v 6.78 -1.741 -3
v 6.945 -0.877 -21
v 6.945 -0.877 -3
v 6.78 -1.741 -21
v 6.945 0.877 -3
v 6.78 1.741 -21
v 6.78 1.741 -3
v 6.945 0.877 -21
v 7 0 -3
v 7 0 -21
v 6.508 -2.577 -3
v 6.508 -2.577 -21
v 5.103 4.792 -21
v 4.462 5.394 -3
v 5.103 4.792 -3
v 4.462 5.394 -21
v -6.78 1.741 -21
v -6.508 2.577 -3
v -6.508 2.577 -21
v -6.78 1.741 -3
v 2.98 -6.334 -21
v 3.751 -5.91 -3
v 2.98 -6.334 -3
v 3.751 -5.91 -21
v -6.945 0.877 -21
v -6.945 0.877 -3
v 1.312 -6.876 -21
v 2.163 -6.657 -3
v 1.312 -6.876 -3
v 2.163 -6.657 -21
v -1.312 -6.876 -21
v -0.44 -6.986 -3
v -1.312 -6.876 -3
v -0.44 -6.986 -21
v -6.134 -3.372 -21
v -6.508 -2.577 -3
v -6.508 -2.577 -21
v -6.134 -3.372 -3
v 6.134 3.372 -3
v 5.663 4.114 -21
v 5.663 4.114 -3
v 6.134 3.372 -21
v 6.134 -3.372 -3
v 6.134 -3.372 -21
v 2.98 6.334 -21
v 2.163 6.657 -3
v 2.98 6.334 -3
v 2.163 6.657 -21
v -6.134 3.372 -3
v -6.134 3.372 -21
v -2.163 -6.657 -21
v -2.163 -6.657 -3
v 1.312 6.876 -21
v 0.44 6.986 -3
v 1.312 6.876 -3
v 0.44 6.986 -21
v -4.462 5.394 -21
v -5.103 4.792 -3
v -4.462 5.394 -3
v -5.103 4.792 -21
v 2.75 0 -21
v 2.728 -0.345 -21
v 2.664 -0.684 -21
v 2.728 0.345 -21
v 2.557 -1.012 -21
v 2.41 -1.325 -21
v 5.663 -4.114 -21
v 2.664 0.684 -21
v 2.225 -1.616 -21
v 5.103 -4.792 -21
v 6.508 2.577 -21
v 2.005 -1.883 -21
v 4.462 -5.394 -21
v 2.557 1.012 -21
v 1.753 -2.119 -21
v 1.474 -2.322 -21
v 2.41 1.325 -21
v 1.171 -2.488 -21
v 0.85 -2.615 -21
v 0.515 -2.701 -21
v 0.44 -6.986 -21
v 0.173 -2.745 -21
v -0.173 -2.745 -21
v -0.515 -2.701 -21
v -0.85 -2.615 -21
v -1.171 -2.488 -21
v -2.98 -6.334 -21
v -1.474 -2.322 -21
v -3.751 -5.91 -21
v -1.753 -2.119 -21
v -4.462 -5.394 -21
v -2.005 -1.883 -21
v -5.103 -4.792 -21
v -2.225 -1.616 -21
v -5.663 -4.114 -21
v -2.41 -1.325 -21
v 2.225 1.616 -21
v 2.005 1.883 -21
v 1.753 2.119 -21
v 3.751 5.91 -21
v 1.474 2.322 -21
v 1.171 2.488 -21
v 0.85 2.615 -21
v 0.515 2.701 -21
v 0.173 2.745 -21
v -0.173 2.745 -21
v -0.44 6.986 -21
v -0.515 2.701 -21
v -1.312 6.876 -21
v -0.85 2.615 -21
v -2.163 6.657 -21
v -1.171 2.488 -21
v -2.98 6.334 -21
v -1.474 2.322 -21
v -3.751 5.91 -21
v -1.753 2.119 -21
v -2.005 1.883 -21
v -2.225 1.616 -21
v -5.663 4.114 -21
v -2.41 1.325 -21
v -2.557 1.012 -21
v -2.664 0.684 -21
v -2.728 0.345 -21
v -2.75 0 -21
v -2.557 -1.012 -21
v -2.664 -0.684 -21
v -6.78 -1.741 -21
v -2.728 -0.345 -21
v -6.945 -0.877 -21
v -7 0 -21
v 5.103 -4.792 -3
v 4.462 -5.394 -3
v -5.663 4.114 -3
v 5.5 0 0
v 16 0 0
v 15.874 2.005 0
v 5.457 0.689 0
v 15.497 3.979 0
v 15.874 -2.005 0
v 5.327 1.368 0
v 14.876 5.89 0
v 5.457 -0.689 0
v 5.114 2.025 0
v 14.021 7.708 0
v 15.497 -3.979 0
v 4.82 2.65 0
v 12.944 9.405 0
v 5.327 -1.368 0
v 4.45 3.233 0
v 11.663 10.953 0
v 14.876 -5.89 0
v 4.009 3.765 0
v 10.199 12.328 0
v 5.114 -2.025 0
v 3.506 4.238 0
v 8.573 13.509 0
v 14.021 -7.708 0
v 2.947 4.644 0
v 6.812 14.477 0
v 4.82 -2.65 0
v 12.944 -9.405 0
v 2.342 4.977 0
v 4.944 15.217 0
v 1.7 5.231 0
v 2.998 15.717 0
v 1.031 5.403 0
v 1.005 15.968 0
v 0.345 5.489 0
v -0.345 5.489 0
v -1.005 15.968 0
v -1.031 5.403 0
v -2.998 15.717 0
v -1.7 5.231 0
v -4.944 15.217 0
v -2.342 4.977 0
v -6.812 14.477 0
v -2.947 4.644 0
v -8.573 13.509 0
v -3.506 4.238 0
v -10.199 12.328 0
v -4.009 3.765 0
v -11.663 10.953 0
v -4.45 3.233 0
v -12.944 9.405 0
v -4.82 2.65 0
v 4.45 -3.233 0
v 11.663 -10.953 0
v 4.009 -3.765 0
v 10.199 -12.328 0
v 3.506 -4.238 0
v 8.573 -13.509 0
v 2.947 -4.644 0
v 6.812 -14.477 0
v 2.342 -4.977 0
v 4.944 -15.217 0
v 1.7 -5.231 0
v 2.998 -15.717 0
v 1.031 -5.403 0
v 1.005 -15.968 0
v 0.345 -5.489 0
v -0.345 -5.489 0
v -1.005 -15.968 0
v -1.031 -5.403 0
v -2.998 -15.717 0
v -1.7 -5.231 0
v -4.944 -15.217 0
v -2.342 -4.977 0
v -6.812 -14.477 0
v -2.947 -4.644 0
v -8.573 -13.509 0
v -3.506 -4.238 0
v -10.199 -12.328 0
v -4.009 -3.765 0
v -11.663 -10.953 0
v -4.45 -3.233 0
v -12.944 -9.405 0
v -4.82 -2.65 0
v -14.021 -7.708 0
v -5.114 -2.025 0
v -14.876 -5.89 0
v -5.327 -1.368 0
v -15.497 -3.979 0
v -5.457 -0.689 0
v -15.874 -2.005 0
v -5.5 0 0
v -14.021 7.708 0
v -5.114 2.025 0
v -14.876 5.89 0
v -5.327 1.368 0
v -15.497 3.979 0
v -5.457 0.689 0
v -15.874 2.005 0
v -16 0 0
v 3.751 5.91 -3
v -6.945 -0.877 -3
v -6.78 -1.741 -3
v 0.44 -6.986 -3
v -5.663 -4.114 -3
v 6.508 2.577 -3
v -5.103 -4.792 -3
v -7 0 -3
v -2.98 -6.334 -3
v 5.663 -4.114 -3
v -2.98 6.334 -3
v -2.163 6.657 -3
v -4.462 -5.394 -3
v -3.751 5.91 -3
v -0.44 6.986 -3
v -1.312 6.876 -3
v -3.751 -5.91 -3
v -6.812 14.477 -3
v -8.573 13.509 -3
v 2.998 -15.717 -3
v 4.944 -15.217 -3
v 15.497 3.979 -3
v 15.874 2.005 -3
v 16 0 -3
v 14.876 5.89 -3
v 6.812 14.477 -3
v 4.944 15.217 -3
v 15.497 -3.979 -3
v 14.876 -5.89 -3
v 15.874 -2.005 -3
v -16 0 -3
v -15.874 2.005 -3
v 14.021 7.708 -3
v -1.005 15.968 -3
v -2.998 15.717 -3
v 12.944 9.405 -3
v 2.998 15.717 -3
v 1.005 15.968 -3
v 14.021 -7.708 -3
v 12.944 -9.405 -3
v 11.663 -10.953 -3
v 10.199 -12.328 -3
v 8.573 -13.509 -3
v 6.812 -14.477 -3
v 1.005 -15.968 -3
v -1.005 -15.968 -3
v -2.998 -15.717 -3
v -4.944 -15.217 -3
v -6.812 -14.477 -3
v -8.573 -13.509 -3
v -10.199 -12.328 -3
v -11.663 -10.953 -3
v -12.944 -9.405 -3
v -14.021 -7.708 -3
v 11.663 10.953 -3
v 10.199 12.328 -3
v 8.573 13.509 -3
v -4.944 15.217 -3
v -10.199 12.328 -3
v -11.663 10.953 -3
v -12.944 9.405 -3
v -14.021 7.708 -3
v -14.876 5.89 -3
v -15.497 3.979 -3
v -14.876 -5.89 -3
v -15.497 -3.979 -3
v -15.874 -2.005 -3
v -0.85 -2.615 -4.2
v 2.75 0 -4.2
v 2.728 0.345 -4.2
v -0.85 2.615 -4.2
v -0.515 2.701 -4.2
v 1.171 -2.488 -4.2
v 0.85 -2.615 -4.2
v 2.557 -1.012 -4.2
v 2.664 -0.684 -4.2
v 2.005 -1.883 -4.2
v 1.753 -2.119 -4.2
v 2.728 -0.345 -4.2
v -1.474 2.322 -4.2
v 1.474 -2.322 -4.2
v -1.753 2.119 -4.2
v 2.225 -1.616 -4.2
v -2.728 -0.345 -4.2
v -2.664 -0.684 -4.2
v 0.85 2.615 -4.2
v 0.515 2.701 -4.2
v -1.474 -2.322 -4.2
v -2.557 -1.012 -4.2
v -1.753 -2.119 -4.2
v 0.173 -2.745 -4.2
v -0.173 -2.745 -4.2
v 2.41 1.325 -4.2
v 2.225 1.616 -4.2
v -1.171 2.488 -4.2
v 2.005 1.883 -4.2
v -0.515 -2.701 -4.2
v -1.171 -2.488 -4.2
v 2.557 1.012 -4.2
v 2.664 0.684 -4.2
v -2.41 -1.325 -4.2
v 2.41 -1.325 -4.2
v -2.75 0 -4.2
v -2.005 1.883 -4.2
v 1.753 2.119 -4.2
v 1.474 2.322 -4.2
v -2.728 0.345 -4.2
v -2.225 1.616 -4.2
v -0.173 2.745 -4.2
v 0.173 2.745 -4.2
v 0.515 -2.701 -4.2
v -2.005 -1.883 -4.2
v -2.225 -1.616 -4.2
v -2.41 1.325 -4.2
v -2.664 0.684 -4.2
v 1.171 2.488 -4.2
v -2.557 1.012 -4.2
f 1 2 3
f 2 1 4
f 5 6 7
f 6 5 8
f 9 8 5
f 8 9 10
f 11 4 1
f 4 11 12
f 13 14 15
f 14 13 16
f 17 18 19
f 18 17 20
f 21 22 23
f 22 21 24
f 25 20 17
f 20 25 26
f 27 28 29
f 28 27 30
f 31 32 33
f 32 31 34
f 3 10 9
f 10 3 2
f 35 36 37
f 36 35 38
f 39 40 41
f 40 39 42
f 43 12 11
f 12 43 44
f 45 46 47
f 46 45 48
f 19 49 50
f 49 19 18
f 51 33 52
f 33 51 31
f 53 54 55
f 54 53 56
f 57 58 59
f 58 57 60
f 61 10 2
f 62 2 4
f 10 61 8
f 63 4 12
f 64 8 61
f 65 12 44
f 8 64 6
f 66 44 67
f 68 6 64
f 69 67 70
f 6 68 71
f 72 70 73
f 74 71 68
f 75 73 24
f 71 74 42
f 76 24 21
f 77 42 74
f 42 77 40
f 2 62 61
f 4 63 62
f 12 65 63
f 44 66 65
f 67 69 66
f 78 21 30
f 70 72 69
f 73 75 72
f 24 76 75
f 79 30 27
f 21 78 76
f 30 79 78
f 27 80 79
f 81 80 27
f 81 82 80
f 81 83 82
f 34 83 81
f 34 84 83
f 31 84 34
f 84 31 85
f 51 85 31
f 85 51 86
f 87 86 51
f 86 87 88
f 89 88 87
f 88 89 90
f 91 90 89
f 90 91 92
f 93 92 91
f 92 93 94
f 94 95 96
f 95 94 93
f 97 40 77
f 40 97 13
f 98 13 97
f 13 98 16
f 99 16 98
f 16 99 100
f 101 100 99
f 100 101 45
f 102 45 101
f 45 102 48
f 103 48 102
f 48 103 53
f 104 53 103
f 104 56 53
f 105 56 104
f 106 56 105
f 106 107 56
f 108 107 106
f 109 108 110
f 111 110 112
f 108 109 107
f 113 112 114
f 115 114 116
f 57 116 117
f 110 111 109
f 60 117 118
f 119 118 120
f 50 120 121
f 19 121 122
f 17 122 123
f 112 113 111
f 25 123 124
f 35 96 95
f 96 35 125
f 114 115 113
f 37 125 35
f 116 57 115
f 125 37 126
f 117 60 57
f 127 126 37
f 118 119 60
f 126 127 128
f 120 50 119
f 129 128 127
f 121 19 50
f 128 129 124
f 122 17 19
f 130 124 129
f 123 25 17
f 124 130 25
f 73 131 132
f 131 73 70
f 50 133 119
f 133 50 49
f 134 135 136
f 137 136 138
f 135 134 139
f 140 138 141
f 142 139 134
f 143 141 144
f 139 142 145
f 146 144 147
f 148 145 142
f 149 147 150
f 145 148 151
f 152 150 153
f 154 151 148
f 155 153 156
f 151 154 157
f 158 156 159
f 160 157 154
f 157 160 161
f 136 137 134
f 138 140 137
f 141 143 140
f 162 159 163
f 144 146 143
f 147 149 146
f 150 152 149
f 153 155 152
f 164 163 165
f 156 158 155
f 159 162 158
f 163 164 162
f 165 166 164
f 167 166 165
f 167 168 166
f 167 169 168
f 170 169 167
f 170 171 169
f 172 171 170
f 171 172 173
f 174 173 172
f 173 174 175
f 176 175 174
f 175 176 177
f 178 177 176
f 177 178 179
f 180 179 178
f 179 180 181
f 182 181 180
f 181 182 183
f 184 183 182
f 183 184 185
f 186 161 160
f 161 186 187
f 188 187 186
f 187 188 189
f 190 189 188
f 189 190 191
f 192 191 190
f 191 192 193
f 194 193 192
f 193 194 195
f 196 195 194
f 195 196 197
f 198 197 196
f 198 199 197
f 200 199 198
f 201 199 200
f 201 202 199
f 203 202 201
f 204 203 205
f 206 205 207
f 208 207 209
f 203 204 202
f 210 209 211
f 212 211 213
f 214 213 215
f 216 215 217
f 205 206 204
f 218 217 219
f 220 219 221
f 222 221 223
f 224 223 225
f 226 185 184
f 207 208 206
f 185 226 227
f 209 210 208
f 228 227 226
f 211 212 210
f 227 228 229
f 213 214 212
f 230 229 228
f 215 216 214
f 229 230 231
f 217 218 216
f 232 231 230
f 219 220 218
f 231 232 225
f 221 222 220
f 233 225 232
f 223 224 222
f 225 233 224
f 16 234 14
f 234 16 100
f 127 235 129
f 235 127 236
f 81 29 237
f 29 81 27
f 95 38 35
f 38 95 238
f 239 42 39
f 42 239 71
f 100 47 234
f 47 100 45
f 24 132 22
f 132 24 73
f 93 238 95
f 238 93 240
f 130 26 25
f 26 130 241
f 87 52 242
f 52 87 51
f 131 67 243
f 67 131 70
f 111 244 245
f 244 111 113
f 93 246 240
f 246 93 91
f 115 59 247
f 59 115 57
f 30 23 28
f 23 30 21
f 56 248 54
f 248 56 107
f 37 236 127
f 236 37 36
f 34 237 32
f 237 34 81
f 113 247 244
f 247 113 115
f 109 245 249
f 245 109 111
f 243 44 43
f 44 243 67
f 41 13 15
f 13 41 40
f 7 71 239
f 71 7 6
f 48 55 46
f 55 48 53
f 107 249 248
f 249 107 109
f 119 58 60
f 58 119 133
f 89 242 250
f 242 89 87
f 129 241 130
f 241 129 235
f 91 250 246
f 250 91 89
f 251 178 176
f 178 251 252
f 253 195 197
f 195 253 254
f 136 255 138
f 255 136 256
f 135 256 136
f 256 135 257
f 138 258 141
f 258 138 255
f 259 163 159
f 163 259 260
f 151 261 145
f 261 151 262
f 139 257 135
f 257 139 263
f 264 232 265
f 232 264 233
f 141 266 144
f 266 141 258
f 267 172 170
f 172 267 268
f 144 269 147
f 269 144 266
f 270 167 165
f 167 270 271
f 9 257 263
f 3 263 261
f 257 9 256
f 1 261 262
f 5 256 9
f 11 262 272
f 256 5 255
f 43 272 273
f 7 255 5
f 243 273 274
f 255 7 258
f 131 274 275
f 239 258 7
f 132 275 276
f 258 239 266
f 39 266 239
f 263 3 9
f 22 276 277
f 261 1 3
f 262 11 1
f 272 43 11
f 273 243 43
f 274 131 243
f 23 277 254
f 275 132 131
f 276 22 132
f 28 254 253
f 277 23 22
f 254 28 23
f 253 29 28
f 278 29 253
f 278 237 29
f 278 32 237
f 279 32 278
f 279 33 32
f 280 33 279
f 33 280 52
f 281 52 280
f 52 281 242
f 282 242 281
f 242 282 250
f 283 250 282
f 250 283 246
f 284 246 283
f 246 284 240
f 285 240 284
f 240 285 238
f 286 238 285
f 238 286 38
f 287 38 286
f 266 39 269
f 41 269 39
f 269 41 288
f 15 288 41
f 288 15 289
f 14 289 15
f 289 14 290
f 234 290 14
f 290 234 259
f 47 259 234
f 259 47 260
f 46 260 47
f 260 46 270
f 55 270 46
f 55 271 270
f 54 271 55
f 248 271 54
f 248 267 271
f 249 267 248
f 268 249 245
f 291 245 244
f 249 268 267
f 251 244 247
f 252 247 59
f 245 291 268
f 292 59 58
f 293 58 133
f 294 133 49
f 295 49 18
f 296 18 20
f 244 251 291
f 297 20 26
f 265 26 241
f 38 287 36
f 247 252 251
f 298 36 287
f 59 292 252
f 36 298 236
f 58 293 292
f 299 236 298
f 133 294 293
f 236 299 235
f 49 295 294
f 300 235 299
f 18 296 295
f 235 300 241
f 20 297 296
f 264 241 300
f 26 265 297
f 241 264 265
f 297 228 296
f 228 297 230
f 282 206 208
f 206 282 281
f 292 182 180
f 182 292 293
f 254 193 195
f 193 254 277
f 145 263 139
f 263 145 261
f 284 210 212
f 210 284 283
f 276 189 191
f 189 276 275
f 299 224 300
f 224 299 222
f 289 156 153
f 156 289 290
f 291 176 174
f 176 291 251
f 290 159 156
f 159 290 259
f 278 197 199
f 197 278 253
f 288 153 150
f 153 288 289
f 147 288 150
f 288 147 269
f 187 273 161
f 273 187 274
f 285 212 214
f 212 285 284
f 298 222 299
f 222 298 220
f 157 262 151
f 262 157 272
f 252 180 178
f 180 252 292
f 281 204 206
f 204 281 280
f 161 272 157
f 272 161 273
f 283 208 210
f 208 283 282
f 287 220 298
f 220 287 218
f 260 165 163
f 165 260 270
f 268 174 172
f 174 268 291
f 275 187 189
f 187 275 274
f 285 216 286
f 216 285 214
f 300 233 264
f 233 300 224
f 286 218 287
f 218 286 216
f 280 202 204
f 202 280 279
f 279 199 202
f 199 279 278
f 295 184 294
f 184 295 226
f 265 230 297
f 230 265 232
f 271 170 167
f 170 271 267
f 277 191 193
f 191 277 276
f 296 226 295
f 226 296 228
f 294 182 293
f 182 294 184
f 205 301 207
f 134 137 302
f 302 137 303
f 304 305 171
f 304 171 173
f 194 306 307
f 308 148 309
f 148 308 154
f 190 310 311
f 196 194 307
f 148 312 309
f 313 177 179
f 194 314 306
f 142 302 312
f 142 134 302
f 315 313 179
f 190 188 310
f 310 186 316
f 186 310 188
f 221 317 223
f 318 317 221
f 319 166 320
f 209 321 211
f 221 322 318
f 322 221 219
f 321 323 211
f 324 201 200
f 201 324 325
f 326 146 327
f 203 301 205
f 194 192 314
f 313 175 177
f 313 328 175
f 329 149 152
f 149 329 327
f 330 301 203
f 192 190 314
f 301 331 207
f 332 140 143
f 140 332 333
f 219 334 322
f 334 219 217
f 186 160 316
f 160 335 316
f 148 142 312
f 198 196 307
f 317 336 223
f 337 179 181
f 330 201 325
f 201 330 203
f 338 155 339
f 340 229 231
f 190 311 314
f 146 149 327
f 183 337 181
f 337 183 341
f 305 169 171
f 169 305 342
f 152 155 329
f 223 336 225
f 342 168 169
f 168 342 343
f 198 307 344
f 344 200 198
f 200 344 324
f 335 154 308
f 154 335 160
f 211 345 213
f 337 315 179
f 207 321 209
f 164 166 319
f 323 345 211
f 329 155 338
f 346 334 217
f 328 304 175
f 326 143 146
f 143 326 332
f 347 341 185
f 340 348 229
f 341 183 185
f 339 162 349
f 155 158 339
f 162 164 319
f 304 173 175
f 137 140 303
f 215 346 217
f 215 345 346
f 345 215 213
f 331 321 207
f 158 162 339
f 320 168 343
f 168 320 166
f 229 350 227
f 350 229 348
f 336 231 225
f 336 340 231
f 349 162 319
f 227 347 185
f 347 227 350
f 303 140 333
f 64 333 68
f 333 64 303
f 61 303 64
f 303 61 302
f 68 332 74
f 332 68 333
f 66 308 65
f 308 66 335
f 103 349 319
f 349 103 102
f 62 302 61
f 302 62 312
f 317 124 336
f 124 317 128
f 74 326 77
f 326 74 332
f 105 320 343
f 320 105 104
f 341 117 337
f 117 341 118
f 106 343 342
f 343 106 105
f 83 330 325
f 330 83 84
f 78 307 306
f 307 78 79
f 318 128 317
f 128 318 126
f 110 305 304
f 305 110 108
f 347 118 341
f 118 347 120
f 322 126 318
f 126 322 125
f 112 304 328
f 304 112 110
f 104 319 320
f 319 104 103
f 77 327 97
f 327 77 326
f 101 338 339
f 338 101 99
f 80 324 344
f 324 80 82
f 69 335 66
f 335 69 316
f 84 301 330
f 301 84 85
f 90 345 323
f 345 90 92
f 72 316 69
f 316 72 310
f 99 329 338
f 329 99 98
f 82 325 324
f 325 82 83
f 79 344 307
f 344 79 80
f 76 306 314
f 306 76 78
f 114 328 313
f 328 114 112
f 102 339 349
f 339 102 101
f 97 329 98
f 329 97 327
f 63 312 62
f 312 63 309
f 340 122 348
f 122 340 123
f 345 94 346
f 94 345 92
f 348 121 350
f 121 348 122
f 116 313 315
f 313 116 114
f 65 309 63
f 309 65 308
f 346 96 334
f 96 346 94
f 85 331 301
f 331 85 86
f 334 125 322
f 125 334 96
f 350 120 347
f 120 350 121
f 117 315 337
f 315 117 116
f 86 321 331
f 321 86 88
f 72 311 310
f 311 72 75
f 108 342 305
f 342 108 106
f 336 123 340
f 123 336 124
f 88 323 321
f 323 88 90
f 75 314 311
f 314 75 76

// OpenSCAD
$fn = 50;


difference() {
	union() {
		translate(v = [0, 0, -21.0000000000]) {
			cylinder(h = 21, r = 7.0000000000);
		}
		translate(v = [0, 0, -3.0000000000]) {
			cylinder(h = 3, r = 16.0000000000);
		}
	}
	union() {
		translate(v = [0, 0, 0]) {
			rotate(a = [0, 0, 0]) {
				difference() {
					union() {
						#translate(v = [0, 0, -21.0000000000]) {
							cylinder(h = 21, r = 2.2500000000);
						}
						#translate(v = [0, 0, -4.2000000000]) {
							cylinder(h = 4.2000000000, r = 7.0000000000, r1 = 2.7500000000, r2 = 5.5000000000);
						}
						#translate(v = [0, 0, -21.0000000000]) {
							cylinder(h = 21, r = 2.7500000000);
						}
						#translate(v = [0, 0, -21.0000000000]) {
							cylinder(h = 21, r = 2.2500000000);
						}
					}
					union();
				}
			}
		}
	}
}
